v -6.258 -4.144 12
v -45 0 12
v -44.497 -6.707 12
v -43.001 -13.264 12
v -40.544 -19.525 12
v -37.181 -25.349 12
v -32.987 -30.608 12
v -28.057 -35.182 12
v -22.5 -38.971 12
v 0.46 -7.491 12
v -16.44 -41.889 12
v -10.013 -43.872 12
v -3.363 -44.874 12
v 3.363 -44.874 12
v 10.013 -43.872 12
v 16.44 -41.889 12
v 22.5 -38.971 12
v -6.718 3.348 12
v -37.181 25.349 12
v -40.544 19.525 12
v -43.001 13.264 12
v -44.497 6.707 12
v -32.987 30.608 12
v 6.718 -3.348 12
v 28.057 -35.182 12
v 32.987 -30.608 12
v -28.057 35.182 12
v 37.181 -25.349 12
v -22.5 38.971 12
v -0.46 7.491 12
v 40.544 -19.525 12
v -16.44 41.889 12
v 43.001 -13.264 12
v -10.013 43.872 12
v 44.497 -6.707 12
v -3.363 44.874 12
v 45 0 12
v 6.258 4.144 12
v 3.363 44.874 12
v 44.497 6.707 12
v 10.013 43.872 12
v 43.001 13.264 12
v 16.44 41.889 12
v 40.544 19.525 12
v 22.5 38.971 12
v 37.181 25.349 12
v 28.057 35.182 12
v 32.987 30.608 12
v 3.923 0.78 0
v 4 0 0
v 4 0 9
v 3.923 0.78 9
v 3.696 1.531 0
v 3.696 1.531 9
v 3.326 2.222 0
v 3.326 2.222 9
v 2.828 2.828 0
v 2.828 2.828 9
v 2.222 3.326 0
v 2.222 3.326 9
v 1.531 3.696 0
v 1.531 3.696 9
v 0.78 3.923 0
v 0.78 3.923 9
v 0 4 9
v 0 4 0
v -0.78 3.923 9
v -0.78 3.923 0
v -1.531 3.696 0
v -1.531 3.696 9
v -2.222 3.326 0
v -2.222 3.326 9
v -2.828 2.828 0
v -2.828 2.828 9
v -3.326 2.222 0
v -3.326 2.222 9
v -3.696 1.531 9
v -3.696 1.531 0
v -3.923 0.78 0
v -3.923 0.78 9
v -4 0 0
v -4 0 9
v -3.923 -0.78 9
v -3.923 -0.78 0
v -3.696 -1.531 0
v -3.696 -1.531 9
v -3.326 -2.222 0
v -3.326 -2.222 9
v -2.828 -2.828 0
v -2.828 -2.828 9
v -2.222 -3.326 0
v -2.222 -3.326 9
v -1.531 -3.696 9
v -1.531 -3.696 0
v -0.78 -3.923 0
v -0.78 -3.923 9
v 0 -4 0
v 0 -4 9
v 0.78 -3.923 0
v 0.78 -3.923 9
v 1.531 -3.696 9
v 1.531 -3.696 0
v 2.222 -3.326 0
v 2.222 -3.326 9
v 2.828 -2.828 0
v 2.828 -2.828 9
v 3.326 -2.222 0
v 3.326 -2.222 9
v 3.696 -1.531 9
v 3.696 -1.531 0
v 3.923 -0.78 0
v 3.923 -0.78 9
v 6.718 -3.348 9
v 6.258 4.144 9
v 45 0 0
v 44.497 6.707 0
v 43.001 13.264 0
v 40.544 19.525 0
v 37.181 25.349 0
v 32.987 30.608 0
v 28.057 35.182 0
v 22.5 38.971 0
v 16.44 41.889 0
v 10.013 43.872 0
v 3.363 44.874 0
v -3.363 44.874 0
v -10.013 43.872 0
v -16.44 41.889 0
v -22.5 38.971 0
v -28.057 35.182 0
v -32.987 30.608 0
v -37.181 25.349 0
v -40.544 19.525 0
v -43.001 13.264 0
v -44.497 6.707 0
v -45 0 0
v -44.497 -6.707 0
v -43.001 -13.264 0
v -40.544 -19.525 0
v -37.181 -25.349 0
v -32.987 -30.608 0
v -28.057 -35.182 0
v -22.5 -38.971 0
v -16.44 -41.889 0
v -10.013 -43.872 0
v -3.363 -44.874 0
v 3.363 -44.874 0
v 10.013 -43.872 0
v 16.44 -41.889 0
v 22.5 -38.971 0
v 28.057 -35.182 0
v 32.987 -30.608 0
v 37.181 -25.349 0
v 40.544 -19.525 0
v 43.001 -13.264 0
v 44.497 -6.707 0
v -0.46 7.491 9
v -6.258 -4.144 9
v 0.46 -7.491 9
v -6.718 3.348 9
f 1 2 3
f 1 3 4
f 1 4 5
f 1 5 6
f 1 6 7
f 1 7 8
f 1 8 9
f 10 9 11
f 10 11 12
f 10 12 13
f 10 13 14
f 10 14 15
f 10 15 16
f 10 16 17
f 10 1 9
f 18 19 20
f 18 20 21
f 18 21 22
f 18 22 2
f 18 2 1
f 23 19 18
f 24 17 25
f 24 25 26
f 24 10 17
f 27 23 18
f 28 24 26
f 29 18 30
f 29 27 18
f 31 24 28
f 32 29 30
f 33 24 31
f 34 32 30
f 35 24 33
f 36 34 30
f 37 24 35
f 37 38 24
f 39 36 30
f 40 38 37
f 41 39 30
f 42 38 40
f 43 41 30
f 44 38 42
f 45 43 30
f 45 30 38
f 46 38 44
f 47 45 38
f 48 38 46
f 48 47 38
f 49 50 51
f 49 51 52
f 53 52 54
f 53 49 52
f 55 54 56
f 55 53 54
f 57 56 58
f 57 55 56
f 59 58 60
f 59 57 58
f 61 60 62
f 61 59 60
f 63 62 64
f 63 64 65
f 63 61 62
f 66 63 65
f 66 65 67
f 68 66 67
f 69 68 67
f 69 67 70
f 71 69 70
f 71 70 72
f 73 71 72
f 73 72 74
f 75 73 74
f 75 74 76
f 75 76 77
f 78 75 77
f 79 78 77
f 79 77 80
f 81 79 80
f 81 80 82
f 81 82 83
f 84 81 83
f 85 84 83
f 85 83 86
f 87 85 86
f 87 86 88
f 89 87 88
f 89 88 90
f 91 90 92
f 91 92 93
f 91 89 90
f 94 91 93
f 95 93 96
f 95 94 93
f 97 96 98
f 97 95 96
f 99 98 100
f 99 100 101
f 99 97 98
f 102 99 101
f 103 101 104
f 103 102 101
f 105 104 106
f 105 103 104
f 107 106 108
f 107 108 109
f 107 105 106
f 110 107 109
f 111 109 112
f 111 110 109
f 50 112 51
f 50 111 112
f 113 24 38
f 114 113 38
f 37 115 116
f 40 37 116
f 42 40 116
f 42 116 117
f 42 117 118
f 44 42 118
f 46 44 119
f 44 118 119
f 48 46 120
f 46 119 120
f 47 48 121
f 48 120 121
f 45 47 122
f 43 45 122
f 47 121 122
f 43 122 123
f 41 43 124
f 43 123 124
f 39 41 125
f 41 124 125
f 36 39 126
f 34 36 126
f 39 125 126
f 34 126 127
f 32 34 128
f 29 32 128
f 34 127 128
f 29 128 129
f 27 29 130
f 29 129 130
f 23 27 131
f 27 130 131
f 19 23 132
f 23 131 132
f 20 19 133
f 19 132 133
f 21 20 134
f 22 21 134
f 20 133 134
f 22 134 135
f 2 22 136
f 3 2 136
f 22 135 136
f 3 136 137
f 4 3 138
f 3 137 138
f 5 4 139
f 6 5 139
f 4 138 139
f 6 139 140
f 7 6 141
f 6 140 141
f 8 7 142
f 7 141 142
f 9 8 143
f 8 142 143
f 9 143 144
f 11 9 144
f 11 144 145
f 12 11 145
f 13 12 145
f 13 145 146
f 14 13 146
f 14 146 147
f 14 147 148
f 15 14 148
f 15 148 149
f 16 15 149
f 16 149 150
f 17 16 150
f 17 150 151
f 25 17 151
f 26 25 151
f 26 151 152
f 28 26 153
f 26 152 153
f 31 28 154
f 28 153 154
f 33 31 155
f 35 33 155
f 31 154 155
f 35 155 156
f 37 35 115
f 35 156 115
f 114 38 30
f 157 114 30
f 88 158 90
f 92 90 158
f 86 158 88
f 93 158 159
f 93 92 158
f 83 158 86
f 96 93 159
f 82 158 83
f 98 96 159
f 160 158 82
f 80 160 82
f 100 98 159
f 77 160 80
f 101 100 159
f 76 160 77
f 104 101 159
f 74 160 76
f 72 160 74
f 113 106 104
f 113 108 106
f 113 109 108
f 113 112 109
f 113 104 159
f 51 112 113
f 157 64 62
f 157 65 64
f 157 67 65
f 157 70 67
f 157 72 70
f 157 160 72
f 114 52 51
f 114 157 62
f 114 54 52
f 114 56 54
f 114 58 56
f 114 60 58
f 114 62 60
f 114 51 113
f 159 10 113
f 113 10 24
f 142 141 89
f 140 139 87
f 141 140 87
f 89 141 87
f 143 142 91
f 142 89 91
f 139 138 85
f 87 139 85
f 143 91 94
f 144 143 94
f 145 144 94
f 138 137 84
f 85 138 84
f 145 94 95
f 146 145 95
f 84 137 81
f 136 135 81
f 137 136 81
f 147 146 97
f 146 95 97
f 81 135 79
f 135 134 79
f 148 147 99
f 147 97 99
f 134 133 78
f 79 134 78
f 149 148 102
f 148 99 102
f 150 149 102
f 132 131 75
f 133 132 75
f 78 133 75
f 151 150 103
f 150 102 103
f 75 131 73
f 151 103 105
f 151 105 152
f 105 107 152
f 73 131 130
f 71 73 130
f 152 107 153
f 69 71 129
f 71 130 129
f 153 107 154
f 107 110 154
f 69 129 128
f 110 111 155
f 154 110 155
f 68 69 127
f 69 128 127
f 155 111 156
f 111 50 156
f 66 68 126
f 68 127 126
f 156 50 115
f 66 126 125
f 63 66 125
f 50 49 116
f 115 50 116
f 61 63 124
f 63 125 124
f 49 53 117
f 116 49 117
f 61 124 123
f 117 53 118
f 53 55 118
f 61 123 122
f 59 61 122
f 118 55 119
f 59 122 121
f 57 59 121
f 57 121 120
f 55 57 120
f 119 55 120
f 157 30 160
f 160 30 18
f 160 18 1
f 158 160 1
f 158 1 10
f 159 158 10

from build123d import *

# Parameters (mm, degrees)
F0_R     = 45
F0_R_2   = 4
F1_DEPTH = 12
F2_R     = 4
F3_DEPTH = 3


with BuildPart() as f1:
    # F0 (on Top) → F1 (new body)
    with BuildSketch(Plane.XY):
        Circle(F0_R)
        Circle(F0_R_2, mode=Mode.SUBTRACT)
    extrude(amount=F1_DEPTH)

    # F2 (on face) → F3 (cut)
    with BuildSketch(Plane.XY.offset(12)):
        Polygon((0.459643, -7.491466), (6.717621, -3.347671), (6.257979, 4.143795), (-0.459643, 7.491466), (-6.717621, 3.347671), (-6.257979, -4.143795), align=None)
        Circle(F2_R, mode=Mode.SUBTRACT)
    extrude(amount=-F3_DEPTH, mode=Mode.SUBTRACT)


solid = f1.part
